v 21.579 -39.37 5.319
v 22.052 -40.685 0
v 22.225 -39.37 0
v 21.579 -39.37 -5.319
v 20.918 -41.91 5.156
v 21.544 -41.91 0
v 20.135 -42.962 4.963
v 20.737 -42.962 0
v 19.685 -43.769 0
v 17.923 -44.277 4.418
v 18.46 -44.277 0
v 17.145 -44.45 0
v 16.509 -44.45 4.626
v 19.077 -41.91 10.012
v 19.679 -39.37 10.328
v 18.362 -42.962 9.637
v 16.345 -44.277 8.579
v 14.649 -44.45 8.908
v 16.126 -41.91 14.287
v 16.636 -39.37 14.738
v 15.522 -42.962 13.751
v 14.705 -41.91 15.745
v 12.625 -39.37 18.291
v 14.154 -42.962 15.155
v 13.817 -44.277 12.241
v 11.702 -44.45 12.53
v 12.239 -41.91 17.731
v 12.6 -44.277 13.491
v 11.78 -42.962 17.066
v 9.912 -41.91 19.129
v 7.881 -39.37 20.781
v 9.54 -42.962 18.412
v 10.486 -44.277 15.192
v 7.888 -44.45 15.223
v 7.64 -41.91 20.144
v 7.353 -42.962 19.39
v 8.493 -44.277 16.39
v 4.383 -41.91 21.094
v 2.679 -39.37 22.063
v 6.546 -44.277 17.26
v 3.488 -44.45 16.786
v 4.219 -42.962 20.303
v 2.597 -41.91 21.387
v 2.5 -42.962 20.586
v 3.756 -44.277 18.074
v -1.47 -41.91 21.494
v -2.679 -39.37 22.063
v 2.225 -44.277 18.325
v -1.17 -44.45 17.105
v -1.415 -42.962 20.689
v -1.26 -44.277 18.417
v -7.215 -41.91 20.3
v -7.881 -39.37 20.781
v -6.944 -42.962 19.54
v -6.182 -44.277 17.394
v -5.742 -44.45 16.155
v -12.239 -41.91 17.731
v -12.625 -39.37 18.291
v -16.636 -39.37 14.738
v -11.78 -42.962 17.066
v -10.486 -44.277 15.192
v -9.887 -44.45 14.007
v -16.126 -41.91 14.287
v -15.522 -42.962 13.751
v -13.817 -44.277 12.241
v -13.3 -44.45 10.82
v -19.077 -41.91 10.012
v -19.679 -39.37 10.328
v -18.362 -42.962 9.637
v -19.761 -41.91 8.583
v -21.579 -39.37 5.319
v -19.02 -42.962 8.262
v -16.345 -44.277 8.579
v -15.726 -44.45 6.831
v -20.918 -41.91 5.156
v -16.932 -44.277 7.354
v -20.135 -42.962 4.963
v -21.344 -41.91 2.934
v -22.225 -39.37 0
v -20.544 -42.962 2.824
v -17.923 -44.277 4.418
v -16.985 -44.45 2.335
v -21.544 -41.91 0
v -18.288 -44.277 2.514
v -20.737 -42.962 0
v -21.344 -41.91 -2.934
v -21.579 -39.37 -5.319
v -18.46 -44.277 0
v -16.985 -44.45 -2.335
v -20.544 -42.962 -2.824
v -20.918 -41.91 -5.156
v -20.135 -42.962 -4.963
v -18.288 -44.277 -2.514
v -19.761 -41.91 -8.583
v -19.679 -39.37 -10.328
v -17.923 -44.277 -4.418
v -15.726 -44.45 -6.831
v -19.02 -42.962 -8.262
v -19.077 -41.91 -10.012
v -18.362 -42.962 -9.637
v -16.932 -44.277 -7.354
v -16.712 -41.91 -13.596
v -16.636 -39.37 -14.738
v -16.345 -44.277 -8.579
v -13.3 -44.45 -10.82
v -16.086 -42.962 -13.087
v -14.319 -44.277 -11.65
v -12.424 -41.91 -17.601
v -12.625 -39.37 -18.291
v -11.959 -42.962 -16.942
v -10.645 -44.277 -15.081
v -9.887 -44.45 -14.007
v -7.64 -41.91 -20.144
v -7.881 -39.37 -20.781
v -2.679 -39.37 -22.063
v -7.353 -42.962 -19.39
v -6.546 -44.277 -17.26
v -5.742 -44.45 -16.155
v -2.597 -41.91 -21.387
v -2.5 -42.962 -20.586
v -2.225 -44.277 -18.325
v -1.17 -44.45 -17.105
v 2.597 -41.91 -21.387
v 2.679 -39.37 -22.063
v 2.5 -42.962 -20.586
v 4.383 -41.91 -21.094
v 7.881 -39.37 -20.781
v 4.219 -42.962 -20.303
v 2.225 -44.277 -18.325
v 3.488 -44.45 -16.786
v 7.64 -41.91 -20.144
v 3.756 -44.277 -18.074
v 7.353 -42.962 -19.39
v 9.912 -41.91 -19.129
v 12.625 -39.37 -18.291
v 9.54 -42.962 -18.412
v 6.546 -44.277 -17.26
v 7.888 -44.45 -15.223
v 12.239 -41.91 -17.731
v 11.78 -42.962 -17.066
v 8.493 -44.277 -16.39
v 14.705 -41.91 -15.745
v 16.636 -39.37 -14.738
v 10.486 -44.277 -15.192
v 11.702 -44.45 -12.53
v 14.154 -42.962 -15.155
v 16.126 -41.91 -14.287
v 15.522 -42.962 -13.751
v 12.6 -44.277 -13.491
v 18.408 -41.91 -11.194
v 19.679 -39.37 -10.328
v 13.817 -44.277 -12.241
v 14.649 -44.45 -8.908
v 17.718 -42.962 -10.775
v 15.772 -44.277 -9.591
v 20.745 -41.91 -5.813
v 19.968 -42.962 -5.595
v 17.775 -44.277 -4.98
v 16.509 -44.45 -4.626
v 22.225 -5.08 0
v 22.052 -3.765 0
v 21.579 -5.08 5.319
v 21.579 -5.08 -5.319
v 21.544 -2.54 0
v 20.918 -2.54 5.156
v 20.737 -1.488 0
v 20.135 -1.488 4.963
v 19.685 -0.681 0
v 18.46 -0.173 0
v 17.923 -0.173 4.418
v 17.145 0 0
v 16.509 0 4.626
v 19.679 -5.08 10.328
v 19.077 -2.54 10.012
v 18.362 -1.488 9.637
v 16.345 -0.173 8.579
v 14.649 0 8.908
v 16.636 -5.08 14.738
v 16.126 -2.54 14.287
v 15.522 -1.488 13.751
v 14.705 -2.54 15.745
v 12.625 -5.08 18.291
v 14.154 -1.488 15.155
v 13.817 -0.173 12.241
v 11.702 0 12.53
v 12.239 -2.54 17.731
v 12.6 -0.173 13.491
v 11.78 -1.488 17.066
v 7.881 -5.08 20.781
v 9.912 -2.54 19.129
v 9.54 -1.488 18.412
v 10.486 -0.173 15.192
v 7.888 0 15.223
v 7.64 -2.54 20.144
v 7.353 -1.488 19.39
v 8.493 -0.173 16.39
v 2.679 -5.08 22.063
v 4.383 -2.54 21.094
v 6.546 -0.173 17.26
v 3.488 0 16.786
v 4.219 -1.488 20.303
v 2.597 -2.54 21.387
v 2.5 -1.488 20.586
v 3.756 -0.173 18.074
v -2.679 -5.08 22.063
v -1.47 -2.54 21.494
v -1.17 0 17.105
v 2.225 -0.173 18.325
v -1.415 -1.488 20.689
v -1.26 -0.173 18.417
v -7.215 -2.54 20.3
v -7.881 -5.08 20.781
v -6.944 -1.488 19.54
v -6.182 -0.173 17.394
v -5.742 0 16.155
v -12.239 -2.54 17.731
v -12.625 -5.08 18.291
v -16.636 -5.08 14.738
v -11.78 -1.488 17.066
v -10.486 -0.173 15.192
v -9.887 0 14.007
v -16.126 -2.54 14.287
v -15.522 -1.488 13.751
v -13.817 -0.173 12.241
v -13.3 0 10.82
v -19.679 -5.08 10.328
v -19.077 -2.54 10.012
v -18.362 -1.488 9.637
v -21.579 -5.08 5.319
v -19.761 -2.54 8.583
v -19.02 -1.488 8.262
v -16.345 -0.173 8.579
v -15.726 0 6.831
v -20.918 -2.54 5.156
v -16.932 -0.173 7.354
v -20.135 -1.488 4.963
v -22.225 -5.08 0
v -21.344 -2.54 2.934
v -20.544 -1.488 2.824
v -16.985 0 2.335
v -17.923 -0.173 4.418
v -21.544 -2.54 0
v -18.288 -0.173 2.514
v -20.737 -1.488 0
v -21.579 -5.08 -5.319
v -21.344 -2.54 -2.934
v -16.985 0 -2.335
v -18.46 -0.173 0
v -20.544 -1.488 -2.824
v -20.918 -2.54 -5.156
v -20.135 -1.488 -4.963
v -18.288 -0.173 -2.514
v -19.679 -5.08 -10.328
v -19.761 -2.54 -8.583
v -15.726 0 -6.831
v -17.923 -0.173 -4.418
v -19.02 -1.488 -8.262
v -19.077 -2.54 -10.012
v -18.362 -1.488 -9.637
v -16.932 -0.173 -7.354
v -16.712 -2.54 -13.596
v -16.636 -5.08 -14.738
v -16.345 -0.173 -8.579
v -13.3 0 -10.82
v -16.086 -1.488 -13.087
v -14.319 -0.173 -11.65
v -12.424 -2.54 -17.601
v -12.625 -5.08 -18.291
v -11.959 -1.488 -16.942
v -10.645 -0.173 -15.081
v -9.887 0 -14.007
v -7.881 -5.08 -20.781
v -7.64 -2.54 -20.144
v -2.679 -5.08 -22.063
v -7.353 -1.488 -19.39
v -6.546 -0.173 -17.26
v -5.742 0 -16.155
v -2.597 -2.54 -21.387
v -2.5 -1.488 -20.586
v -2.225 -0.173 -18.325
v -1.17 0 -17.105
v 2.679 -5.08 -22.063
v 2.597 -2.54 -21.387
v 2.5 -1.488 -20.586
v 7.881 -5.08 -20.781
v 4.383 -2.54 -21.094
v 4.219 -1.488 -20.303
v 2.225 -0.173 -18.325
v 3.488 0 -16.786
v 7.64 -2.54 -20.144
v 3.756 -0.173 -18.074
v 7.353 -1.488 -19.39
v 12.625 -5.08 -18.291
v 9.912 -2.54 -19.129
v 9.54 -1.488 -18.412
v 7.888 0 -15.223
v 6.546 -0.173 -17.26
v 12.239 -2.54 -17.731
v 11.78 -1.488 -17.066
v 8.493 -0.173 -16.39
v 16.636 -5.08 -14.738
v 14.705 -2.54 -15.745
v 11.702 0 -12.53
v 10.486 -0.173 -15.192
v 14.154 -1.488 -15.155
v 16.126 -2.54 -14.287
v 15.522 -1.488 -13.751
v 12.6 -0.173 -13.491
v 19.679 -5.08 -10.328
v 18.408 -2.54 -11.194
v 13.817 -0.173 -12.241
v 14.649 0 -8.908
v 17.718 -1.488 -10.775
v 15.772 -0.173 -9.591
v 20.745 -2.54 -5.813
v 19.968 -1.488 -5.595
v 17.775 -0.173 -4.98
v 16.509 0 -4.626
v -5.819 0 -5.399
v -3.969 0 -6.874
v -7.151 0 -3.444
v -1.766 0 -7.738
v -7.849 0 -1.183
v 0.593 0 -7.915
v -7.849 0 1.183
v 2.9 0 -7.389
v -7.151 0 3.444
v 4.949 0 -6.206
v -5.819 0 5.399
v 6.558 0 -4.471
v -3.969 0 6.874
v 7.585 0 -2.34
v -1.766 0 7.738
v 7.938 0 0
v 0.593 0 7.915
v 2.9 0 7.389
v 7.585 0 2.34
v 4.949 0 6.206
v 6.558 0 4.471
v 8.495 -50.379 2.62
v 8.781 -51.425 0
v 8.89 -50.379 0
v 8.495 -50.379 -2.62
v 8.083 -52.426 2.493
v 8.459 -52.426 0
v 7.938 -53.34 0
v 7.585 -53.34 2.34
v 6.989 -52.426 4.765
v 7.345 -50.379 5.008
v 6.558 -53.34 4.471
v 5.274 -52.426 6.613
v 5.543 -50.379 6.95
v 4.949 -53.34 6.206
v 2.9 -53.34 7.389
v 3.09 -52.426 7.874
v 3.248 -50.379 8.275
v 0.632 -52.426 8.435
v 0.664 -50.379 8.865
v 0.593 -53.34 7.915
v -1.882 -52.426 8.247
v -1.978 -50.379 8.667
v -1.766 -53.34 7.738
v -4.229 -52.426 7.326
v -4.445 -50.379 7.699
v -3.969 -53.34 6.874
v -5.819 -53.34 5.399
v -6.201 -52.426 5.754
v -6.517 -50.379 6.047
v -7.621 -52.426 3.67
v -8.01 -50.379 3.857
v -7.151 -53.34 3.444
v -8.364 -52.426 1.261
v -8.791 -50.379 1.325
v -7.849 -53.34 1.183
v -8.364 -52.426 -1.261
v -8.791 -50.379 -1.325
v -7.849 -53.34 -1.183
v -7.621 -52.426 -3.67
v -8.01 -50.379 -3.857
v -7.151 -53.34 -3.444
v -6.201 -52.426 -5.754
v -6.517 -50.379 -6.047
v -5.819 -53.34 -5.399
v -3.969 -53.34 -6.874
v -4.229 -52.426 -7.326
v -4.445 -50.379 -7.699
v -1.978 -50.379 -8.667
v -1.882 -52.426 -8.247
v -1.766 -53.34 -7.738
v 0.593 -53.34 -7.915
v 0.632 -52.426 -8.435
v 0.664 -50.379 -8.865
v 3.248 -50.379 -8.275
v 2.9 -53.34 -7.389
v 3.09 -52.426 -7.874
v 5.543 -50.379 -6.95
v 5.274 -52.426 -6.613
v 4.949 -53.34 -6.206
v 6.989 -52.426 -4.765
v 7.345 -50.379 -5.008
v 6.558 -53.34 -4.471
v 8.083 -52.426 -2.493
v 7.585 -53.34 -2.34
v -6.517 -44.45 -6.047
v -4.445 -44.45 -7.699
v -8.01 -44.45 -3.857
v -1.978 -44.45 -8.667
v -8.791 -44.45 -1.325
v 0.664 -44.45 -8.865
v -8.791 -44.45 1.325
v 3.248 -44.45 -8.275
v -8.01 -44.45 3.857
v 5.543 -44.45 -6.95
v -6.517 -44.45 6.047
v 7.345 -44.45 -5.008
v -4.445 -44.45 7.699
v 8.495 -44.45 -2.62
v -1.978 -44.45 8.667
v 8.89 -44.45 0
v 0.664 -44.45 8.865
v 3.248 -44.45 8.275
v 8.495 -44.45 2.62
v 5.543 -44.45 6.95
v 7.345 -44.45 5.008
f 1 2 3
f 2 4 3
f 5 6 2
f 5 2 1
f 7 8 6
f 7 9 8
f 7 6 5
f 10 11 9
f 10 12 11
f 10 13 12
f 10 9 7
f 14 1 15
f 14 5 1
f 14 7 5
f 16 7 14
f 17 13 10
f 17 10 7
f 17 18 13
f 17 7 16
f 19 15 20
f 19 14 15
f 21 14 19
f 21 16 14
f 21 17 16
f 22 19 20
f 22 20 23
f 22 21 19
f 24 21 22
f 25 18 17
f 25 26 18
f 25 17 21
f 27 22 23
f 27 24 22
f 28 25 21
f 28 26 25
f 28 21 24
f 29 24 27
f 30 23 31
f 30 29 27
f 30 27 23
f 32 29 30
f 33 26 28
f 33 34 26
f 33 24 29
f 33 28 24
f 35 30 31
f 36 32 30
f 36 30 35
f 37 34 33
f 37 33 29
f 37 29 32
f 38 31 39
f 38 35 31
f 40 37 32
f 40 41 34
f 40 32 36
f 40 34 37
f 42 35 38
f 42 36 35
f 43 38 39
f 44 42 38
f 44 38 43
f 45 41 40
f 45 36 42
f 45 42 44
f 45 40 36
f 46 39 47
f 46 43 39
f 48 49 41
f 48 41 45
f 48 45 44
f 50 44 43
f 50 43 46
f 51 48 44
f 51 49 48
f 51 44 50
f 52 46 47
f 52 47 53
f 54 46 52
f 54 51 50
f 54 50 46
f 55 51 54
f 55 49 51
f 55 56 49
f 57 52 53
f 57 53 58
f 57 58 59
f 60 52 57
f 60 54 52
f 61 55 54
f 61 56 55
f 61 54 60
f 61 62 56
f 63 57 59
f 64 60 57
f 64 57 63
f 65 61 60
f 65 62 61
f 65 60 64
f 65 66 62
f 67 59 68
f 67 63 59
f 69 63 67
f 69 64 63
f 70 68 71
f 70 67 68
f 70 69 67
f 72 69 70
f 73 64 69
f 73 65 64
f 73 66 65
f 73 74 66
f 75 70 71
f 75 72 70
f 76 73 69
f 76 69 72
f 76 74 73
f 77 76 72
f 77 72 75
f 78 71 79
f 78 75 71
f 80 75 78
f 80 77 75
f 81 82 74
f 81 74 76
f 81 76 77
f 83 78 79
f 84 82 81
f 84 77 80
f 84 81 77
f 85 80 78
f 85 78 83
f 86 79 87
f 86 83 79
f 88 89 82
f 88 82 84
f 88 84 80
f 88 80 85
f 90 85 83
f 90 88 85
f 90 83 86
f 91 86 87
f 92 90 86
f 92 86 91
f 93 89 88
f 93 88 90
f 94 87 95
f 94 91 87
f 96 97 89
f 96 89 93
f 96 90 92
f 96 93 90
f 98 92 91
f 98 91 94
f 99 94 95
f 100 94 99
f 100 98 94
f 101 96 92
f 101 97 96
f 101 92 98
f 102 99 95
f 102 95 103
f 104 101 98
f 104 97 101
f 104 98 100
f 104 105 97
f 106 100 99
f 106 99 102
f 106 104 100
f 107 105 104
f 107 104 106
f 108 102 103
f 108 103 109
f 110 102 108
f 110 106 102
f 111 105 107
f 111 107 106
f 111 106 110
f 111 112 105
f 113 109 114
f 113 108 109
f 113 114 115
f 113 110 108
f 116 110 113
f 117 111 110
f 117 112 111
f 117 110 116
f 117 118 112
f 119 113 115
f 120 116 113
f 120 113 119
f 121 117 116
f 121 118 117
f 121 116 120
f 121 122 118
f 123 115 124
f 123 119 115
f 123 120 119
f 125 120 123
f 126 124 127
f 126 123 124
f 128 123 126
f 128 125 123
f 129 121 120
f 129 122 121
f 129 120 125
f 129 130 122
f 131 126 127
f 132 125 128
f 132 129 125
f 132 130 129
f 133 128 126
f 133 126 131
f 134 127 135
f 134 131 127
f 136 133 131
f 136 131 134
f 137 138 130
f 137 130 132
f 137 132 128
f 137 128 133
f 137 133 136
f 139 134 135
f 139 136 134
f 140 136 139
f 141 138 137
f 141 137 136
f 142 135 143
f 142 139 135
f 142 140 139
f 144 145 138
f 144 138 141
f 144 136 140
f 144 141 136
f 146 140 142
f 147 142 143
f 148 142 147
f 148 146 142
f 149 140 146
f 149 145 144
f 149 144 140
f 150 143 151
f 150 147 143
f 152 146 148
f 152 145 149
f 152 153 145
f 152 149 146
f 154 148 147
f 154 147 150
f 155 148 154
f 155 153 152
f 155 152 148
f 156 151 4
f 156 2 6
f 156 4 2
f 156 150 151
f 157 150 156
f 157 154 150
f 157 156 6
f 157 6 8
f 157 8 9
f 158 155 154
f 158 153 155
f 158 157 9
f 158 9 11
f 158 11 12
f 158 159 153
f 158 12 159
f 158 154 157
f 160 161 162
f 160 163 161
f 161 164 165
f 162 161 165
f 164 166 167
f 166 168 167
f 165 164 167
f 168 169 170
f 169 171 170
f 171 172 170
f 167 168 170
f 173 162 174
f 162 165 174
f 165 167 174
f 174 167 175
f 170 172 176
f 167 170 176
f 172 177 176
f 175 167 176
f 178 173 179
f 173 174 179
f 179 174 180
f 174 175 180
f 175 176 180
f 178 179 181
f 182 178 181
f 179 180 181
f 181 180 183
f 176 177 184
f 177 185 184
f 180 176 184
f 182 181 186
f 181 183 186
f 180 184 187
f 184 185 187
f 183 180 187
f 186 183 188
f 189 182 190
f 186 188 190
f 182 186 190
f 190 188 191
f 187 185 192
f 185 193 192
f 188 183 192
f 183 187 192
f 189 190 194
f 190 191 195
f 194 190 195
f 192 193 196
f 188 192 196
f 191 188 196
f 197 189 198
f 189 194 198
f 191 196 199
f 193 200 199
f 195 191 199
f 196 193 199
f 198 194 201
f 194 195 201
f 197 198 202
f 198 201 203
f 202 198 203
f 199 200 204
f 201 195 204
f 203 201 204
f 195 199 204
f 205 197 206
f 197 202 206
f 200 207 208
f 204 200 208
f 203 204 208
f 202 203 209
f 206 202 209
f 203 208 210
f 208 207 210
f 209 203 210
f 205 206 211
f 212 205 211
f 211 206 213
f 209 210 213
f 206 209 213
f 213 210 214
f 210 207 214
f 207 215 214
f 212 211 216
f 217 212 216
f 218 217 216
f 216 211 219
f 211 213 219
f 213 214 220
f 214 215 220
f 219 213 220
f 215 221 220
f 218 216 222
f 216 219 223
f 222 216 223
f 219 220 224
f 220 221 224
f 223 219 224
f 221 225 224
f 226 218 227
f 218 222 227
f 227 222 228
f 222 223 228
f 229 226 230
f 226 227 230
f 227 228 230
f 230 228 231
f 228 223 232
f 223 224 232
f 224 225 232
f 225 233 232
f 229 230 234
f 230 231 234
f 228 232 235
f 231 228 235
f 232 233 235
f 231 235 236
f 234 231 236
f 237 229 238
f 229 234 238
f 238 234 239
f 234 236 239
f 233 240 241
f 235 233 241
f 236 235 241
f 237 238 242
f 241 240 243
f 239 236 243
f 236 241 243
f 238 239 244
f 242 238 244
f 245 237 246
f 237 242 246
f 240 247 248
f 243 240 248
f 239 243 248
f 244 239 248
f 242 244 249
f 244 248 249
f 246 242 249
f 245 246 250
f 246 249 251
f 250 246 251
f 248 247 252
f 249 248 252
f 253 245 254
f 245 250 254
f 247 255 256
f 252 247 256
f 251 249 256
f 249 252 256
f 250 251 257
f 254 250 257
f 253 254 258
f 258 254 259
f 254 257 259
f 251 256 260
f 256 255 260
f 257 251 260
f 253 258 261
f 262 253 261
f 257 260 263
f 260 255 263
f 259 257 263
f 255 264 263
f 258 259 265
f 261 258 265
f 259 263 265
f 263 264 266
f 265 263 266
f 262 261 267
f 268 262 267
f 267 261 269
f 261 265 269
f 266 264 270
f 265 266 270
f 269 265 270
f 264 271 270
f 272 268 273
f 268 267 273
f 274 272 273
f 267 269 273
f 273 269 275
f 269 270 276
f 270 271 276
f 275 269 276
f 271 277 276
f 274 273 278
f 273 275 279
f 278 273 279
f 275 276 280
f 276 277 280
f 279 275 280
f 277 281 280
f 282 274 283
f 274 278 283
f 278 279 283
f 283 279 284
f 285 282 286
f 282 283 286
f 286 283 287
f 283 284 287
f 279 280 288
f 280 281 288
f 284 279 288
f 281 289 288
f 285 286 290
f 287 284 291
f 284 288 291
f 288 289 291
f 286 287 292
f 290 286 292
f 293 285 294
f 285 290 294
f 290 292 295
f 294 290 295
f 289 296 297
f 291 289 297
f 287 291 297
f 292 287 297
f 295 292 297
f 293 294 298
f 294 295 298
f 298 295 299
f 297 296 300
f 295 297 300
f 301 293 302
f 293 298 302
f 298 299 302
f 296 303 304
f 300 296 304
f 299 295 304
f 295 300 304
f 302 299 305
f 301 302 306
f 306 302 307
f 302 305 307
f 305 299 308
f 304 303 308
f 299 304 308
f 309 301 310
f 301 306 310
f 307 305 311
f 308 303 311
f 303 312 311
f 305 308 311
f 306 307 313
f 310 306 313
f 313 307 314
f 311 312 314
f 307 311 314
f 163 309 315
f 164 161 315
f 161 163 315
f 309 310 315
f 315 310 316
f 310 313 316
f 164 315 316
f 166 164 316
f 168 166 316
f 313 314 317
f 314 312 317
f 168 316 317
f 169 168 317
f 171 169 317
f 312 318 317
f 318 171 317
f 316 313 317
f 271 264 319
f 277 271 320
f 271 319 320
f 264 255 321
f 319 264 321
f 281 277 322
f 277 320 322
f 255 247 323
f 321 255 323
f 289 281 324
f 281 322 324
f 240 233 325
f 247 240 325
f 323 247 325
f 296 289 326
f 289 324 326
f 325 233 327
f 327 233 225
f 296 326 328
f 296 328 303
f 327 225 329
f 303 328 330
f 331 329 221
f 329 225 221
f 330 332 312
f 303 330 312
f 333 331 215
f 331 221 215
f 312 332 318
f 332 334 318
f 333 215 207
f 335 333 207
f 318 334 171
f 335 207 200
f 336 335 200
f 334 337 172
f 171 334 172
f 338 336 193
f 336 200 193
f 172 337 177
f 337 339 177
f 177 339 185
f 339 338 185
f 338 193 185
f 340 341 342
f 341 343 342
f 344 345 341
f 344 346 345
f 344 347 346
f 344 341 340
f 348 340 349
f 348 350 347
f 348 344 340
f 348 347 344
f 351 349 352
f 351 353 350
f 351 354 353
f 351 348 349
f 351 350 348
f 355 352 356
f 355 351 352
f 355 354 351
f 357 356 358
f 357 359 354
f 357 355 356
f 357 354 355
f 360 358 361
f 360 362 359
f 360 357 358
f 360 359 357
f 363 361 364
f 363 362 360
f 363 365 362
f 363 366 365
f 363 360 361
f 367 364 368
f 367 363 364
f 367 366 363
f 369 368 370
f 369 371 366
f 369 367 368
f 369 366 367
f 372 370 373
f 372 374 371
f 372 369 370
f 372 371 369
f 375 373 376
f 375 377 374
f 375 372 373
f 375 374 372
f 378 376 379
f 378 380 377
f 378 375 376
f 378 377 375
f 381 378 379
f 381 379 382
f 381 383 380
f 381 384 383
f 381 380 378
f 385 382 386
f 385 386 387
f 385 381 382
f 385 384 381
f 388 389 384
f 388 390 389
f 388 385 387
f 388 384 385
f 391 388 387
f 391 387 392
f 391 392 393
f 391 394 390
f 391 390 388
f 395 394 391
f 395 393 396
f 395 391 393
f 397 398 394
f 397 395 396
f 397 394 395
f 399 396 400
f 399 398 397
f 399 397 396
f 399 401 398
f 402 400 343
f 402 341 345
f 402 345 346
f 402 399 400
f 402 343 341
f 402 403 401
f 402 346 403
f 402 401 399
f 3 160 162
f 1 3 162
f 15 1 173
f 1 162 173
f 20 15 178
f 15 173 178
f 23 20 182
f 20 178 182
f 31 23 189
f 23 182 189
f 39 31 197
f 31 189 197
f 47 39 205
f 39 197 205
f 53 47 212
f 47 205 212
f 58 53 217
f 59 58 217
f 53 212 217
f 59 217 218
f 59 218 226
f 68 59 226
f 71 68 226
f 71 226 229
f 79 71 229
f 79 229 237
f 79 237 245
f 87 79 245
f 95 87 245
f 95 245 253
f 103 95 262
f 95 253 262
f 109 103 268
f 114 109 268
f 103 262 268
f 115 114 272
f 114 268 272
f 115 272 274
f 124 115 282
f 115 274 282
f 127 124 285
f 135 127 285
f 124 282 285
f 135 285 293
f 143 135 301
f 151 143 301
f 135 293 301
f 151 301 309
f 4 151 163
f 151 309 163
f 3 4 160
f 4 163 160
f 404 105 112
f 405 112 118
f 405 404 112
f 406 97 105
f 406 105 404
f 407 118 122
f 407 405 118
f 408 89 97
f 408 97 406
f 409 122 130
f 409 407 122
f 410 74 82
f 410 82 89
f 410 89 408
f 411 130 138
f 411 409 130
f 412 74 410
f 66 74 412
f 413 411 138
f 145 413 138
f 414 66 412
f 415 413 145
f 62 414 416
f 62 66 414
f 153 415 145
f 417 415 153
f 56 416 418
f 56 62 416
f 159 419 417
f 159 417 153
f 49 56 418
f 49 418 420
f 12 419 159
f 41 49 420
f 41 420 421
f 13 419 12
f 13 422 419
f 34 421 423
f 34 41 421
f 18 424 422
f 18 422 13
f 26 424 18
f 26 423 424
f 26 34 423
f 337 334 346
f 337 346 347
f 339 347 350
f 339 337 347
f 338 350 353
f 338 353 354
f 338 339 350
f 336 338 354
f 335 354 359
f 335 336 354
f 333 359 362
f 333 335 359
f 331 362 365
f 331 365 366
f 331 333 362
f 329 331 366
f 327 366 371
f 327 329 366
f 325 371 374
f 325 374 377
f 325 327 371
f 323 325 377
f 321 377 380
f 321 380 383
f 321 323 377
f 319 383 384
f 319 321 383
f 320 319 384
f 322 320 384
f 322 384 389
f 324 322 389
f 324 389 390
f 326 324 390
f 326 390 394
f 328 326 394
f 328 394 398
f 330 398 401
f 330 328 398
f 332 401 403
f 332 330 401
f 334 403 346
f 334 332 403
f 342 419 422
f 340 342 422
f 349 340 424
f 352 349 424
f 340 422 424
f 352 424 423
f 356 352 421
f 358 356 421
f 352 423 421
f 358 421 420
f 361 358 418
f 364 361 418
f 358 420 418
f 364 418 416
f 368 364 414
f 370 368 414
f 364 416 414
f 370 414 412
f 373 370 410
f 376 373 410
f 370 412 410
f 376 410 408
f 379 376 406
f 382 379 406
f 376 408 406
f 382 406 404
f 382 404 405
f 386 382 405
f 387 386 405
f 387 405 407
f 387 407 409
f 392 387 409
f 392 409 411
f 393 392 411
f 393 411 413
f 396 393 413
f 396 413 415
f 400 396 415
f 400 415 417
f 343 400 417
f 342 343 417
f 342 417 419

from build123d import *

# Parameters (mm, degrees)
F0_R     = 8.89
F0_R_2   = 7.9375
F1_DEPTH = 53.34
F0_R_3   = 22.225
F2_DEPTH = 44.45
F3_R     = 5.08
F4_R     = 5.08


# Not quite as in the source:
# - a fillet or chamfer that OpenCascade refuses, or shapes differently, is made with other operations: its cross-section is extruded or revolved along the edge and cut away or added


with BuildPart() as f1:
    # F0 (on Front) → F1 (new body)
    with BuildSketch(Plane.XZ):
        Circle(F0_R)
        Circle(F0_R_2, mode=Mode.SUBTRACT)
    extrude(amount=F1_DEPTH)

    # F0 (on Front) → F2 (join)
    with BuildSketch(Plane.XZ):
        Circle(F0_R_3)
        Circle(F0_R, mode=Mode.SUBTRACT)
    extrude(amount=F2_DEPTH)

    # F3
    f3_edges = [f1.edges().sort_by_distance(p)[0] for p in [
        (-22.225, -44.45, 0),
    ]]
    fillet(f3_edges, radius=F3_R)

    # F4
    f4_edges = [f1.edges().sort_by_distance(p)[0] for p in [
        (-22.225, 0, 0),
    ]]
    fillet(f4_edges, radius=F4_R)

    # F5: fillet of radius 5.08 on 1 edges, made by hand

    # F5_s1 → F5_t2 (revolve, cut)
    with BuildSketch(Plane.XY):
        with BuildLine():
            ThreePointArc((8.89, -50.3785571506), (8.6460159222, -51.9339831373), (7.9375, -53.34))
            Line((7.9375, -53.34), (8.89, -53.34))
            Line((8.89, -53.34), (8.89, -50.3785571506))
        make_face()
    revolve(axis=Axis((0, -53.34, 0), (0, -1, 0)), mode=Mode.SUBTRACT)


solid = f1.part
